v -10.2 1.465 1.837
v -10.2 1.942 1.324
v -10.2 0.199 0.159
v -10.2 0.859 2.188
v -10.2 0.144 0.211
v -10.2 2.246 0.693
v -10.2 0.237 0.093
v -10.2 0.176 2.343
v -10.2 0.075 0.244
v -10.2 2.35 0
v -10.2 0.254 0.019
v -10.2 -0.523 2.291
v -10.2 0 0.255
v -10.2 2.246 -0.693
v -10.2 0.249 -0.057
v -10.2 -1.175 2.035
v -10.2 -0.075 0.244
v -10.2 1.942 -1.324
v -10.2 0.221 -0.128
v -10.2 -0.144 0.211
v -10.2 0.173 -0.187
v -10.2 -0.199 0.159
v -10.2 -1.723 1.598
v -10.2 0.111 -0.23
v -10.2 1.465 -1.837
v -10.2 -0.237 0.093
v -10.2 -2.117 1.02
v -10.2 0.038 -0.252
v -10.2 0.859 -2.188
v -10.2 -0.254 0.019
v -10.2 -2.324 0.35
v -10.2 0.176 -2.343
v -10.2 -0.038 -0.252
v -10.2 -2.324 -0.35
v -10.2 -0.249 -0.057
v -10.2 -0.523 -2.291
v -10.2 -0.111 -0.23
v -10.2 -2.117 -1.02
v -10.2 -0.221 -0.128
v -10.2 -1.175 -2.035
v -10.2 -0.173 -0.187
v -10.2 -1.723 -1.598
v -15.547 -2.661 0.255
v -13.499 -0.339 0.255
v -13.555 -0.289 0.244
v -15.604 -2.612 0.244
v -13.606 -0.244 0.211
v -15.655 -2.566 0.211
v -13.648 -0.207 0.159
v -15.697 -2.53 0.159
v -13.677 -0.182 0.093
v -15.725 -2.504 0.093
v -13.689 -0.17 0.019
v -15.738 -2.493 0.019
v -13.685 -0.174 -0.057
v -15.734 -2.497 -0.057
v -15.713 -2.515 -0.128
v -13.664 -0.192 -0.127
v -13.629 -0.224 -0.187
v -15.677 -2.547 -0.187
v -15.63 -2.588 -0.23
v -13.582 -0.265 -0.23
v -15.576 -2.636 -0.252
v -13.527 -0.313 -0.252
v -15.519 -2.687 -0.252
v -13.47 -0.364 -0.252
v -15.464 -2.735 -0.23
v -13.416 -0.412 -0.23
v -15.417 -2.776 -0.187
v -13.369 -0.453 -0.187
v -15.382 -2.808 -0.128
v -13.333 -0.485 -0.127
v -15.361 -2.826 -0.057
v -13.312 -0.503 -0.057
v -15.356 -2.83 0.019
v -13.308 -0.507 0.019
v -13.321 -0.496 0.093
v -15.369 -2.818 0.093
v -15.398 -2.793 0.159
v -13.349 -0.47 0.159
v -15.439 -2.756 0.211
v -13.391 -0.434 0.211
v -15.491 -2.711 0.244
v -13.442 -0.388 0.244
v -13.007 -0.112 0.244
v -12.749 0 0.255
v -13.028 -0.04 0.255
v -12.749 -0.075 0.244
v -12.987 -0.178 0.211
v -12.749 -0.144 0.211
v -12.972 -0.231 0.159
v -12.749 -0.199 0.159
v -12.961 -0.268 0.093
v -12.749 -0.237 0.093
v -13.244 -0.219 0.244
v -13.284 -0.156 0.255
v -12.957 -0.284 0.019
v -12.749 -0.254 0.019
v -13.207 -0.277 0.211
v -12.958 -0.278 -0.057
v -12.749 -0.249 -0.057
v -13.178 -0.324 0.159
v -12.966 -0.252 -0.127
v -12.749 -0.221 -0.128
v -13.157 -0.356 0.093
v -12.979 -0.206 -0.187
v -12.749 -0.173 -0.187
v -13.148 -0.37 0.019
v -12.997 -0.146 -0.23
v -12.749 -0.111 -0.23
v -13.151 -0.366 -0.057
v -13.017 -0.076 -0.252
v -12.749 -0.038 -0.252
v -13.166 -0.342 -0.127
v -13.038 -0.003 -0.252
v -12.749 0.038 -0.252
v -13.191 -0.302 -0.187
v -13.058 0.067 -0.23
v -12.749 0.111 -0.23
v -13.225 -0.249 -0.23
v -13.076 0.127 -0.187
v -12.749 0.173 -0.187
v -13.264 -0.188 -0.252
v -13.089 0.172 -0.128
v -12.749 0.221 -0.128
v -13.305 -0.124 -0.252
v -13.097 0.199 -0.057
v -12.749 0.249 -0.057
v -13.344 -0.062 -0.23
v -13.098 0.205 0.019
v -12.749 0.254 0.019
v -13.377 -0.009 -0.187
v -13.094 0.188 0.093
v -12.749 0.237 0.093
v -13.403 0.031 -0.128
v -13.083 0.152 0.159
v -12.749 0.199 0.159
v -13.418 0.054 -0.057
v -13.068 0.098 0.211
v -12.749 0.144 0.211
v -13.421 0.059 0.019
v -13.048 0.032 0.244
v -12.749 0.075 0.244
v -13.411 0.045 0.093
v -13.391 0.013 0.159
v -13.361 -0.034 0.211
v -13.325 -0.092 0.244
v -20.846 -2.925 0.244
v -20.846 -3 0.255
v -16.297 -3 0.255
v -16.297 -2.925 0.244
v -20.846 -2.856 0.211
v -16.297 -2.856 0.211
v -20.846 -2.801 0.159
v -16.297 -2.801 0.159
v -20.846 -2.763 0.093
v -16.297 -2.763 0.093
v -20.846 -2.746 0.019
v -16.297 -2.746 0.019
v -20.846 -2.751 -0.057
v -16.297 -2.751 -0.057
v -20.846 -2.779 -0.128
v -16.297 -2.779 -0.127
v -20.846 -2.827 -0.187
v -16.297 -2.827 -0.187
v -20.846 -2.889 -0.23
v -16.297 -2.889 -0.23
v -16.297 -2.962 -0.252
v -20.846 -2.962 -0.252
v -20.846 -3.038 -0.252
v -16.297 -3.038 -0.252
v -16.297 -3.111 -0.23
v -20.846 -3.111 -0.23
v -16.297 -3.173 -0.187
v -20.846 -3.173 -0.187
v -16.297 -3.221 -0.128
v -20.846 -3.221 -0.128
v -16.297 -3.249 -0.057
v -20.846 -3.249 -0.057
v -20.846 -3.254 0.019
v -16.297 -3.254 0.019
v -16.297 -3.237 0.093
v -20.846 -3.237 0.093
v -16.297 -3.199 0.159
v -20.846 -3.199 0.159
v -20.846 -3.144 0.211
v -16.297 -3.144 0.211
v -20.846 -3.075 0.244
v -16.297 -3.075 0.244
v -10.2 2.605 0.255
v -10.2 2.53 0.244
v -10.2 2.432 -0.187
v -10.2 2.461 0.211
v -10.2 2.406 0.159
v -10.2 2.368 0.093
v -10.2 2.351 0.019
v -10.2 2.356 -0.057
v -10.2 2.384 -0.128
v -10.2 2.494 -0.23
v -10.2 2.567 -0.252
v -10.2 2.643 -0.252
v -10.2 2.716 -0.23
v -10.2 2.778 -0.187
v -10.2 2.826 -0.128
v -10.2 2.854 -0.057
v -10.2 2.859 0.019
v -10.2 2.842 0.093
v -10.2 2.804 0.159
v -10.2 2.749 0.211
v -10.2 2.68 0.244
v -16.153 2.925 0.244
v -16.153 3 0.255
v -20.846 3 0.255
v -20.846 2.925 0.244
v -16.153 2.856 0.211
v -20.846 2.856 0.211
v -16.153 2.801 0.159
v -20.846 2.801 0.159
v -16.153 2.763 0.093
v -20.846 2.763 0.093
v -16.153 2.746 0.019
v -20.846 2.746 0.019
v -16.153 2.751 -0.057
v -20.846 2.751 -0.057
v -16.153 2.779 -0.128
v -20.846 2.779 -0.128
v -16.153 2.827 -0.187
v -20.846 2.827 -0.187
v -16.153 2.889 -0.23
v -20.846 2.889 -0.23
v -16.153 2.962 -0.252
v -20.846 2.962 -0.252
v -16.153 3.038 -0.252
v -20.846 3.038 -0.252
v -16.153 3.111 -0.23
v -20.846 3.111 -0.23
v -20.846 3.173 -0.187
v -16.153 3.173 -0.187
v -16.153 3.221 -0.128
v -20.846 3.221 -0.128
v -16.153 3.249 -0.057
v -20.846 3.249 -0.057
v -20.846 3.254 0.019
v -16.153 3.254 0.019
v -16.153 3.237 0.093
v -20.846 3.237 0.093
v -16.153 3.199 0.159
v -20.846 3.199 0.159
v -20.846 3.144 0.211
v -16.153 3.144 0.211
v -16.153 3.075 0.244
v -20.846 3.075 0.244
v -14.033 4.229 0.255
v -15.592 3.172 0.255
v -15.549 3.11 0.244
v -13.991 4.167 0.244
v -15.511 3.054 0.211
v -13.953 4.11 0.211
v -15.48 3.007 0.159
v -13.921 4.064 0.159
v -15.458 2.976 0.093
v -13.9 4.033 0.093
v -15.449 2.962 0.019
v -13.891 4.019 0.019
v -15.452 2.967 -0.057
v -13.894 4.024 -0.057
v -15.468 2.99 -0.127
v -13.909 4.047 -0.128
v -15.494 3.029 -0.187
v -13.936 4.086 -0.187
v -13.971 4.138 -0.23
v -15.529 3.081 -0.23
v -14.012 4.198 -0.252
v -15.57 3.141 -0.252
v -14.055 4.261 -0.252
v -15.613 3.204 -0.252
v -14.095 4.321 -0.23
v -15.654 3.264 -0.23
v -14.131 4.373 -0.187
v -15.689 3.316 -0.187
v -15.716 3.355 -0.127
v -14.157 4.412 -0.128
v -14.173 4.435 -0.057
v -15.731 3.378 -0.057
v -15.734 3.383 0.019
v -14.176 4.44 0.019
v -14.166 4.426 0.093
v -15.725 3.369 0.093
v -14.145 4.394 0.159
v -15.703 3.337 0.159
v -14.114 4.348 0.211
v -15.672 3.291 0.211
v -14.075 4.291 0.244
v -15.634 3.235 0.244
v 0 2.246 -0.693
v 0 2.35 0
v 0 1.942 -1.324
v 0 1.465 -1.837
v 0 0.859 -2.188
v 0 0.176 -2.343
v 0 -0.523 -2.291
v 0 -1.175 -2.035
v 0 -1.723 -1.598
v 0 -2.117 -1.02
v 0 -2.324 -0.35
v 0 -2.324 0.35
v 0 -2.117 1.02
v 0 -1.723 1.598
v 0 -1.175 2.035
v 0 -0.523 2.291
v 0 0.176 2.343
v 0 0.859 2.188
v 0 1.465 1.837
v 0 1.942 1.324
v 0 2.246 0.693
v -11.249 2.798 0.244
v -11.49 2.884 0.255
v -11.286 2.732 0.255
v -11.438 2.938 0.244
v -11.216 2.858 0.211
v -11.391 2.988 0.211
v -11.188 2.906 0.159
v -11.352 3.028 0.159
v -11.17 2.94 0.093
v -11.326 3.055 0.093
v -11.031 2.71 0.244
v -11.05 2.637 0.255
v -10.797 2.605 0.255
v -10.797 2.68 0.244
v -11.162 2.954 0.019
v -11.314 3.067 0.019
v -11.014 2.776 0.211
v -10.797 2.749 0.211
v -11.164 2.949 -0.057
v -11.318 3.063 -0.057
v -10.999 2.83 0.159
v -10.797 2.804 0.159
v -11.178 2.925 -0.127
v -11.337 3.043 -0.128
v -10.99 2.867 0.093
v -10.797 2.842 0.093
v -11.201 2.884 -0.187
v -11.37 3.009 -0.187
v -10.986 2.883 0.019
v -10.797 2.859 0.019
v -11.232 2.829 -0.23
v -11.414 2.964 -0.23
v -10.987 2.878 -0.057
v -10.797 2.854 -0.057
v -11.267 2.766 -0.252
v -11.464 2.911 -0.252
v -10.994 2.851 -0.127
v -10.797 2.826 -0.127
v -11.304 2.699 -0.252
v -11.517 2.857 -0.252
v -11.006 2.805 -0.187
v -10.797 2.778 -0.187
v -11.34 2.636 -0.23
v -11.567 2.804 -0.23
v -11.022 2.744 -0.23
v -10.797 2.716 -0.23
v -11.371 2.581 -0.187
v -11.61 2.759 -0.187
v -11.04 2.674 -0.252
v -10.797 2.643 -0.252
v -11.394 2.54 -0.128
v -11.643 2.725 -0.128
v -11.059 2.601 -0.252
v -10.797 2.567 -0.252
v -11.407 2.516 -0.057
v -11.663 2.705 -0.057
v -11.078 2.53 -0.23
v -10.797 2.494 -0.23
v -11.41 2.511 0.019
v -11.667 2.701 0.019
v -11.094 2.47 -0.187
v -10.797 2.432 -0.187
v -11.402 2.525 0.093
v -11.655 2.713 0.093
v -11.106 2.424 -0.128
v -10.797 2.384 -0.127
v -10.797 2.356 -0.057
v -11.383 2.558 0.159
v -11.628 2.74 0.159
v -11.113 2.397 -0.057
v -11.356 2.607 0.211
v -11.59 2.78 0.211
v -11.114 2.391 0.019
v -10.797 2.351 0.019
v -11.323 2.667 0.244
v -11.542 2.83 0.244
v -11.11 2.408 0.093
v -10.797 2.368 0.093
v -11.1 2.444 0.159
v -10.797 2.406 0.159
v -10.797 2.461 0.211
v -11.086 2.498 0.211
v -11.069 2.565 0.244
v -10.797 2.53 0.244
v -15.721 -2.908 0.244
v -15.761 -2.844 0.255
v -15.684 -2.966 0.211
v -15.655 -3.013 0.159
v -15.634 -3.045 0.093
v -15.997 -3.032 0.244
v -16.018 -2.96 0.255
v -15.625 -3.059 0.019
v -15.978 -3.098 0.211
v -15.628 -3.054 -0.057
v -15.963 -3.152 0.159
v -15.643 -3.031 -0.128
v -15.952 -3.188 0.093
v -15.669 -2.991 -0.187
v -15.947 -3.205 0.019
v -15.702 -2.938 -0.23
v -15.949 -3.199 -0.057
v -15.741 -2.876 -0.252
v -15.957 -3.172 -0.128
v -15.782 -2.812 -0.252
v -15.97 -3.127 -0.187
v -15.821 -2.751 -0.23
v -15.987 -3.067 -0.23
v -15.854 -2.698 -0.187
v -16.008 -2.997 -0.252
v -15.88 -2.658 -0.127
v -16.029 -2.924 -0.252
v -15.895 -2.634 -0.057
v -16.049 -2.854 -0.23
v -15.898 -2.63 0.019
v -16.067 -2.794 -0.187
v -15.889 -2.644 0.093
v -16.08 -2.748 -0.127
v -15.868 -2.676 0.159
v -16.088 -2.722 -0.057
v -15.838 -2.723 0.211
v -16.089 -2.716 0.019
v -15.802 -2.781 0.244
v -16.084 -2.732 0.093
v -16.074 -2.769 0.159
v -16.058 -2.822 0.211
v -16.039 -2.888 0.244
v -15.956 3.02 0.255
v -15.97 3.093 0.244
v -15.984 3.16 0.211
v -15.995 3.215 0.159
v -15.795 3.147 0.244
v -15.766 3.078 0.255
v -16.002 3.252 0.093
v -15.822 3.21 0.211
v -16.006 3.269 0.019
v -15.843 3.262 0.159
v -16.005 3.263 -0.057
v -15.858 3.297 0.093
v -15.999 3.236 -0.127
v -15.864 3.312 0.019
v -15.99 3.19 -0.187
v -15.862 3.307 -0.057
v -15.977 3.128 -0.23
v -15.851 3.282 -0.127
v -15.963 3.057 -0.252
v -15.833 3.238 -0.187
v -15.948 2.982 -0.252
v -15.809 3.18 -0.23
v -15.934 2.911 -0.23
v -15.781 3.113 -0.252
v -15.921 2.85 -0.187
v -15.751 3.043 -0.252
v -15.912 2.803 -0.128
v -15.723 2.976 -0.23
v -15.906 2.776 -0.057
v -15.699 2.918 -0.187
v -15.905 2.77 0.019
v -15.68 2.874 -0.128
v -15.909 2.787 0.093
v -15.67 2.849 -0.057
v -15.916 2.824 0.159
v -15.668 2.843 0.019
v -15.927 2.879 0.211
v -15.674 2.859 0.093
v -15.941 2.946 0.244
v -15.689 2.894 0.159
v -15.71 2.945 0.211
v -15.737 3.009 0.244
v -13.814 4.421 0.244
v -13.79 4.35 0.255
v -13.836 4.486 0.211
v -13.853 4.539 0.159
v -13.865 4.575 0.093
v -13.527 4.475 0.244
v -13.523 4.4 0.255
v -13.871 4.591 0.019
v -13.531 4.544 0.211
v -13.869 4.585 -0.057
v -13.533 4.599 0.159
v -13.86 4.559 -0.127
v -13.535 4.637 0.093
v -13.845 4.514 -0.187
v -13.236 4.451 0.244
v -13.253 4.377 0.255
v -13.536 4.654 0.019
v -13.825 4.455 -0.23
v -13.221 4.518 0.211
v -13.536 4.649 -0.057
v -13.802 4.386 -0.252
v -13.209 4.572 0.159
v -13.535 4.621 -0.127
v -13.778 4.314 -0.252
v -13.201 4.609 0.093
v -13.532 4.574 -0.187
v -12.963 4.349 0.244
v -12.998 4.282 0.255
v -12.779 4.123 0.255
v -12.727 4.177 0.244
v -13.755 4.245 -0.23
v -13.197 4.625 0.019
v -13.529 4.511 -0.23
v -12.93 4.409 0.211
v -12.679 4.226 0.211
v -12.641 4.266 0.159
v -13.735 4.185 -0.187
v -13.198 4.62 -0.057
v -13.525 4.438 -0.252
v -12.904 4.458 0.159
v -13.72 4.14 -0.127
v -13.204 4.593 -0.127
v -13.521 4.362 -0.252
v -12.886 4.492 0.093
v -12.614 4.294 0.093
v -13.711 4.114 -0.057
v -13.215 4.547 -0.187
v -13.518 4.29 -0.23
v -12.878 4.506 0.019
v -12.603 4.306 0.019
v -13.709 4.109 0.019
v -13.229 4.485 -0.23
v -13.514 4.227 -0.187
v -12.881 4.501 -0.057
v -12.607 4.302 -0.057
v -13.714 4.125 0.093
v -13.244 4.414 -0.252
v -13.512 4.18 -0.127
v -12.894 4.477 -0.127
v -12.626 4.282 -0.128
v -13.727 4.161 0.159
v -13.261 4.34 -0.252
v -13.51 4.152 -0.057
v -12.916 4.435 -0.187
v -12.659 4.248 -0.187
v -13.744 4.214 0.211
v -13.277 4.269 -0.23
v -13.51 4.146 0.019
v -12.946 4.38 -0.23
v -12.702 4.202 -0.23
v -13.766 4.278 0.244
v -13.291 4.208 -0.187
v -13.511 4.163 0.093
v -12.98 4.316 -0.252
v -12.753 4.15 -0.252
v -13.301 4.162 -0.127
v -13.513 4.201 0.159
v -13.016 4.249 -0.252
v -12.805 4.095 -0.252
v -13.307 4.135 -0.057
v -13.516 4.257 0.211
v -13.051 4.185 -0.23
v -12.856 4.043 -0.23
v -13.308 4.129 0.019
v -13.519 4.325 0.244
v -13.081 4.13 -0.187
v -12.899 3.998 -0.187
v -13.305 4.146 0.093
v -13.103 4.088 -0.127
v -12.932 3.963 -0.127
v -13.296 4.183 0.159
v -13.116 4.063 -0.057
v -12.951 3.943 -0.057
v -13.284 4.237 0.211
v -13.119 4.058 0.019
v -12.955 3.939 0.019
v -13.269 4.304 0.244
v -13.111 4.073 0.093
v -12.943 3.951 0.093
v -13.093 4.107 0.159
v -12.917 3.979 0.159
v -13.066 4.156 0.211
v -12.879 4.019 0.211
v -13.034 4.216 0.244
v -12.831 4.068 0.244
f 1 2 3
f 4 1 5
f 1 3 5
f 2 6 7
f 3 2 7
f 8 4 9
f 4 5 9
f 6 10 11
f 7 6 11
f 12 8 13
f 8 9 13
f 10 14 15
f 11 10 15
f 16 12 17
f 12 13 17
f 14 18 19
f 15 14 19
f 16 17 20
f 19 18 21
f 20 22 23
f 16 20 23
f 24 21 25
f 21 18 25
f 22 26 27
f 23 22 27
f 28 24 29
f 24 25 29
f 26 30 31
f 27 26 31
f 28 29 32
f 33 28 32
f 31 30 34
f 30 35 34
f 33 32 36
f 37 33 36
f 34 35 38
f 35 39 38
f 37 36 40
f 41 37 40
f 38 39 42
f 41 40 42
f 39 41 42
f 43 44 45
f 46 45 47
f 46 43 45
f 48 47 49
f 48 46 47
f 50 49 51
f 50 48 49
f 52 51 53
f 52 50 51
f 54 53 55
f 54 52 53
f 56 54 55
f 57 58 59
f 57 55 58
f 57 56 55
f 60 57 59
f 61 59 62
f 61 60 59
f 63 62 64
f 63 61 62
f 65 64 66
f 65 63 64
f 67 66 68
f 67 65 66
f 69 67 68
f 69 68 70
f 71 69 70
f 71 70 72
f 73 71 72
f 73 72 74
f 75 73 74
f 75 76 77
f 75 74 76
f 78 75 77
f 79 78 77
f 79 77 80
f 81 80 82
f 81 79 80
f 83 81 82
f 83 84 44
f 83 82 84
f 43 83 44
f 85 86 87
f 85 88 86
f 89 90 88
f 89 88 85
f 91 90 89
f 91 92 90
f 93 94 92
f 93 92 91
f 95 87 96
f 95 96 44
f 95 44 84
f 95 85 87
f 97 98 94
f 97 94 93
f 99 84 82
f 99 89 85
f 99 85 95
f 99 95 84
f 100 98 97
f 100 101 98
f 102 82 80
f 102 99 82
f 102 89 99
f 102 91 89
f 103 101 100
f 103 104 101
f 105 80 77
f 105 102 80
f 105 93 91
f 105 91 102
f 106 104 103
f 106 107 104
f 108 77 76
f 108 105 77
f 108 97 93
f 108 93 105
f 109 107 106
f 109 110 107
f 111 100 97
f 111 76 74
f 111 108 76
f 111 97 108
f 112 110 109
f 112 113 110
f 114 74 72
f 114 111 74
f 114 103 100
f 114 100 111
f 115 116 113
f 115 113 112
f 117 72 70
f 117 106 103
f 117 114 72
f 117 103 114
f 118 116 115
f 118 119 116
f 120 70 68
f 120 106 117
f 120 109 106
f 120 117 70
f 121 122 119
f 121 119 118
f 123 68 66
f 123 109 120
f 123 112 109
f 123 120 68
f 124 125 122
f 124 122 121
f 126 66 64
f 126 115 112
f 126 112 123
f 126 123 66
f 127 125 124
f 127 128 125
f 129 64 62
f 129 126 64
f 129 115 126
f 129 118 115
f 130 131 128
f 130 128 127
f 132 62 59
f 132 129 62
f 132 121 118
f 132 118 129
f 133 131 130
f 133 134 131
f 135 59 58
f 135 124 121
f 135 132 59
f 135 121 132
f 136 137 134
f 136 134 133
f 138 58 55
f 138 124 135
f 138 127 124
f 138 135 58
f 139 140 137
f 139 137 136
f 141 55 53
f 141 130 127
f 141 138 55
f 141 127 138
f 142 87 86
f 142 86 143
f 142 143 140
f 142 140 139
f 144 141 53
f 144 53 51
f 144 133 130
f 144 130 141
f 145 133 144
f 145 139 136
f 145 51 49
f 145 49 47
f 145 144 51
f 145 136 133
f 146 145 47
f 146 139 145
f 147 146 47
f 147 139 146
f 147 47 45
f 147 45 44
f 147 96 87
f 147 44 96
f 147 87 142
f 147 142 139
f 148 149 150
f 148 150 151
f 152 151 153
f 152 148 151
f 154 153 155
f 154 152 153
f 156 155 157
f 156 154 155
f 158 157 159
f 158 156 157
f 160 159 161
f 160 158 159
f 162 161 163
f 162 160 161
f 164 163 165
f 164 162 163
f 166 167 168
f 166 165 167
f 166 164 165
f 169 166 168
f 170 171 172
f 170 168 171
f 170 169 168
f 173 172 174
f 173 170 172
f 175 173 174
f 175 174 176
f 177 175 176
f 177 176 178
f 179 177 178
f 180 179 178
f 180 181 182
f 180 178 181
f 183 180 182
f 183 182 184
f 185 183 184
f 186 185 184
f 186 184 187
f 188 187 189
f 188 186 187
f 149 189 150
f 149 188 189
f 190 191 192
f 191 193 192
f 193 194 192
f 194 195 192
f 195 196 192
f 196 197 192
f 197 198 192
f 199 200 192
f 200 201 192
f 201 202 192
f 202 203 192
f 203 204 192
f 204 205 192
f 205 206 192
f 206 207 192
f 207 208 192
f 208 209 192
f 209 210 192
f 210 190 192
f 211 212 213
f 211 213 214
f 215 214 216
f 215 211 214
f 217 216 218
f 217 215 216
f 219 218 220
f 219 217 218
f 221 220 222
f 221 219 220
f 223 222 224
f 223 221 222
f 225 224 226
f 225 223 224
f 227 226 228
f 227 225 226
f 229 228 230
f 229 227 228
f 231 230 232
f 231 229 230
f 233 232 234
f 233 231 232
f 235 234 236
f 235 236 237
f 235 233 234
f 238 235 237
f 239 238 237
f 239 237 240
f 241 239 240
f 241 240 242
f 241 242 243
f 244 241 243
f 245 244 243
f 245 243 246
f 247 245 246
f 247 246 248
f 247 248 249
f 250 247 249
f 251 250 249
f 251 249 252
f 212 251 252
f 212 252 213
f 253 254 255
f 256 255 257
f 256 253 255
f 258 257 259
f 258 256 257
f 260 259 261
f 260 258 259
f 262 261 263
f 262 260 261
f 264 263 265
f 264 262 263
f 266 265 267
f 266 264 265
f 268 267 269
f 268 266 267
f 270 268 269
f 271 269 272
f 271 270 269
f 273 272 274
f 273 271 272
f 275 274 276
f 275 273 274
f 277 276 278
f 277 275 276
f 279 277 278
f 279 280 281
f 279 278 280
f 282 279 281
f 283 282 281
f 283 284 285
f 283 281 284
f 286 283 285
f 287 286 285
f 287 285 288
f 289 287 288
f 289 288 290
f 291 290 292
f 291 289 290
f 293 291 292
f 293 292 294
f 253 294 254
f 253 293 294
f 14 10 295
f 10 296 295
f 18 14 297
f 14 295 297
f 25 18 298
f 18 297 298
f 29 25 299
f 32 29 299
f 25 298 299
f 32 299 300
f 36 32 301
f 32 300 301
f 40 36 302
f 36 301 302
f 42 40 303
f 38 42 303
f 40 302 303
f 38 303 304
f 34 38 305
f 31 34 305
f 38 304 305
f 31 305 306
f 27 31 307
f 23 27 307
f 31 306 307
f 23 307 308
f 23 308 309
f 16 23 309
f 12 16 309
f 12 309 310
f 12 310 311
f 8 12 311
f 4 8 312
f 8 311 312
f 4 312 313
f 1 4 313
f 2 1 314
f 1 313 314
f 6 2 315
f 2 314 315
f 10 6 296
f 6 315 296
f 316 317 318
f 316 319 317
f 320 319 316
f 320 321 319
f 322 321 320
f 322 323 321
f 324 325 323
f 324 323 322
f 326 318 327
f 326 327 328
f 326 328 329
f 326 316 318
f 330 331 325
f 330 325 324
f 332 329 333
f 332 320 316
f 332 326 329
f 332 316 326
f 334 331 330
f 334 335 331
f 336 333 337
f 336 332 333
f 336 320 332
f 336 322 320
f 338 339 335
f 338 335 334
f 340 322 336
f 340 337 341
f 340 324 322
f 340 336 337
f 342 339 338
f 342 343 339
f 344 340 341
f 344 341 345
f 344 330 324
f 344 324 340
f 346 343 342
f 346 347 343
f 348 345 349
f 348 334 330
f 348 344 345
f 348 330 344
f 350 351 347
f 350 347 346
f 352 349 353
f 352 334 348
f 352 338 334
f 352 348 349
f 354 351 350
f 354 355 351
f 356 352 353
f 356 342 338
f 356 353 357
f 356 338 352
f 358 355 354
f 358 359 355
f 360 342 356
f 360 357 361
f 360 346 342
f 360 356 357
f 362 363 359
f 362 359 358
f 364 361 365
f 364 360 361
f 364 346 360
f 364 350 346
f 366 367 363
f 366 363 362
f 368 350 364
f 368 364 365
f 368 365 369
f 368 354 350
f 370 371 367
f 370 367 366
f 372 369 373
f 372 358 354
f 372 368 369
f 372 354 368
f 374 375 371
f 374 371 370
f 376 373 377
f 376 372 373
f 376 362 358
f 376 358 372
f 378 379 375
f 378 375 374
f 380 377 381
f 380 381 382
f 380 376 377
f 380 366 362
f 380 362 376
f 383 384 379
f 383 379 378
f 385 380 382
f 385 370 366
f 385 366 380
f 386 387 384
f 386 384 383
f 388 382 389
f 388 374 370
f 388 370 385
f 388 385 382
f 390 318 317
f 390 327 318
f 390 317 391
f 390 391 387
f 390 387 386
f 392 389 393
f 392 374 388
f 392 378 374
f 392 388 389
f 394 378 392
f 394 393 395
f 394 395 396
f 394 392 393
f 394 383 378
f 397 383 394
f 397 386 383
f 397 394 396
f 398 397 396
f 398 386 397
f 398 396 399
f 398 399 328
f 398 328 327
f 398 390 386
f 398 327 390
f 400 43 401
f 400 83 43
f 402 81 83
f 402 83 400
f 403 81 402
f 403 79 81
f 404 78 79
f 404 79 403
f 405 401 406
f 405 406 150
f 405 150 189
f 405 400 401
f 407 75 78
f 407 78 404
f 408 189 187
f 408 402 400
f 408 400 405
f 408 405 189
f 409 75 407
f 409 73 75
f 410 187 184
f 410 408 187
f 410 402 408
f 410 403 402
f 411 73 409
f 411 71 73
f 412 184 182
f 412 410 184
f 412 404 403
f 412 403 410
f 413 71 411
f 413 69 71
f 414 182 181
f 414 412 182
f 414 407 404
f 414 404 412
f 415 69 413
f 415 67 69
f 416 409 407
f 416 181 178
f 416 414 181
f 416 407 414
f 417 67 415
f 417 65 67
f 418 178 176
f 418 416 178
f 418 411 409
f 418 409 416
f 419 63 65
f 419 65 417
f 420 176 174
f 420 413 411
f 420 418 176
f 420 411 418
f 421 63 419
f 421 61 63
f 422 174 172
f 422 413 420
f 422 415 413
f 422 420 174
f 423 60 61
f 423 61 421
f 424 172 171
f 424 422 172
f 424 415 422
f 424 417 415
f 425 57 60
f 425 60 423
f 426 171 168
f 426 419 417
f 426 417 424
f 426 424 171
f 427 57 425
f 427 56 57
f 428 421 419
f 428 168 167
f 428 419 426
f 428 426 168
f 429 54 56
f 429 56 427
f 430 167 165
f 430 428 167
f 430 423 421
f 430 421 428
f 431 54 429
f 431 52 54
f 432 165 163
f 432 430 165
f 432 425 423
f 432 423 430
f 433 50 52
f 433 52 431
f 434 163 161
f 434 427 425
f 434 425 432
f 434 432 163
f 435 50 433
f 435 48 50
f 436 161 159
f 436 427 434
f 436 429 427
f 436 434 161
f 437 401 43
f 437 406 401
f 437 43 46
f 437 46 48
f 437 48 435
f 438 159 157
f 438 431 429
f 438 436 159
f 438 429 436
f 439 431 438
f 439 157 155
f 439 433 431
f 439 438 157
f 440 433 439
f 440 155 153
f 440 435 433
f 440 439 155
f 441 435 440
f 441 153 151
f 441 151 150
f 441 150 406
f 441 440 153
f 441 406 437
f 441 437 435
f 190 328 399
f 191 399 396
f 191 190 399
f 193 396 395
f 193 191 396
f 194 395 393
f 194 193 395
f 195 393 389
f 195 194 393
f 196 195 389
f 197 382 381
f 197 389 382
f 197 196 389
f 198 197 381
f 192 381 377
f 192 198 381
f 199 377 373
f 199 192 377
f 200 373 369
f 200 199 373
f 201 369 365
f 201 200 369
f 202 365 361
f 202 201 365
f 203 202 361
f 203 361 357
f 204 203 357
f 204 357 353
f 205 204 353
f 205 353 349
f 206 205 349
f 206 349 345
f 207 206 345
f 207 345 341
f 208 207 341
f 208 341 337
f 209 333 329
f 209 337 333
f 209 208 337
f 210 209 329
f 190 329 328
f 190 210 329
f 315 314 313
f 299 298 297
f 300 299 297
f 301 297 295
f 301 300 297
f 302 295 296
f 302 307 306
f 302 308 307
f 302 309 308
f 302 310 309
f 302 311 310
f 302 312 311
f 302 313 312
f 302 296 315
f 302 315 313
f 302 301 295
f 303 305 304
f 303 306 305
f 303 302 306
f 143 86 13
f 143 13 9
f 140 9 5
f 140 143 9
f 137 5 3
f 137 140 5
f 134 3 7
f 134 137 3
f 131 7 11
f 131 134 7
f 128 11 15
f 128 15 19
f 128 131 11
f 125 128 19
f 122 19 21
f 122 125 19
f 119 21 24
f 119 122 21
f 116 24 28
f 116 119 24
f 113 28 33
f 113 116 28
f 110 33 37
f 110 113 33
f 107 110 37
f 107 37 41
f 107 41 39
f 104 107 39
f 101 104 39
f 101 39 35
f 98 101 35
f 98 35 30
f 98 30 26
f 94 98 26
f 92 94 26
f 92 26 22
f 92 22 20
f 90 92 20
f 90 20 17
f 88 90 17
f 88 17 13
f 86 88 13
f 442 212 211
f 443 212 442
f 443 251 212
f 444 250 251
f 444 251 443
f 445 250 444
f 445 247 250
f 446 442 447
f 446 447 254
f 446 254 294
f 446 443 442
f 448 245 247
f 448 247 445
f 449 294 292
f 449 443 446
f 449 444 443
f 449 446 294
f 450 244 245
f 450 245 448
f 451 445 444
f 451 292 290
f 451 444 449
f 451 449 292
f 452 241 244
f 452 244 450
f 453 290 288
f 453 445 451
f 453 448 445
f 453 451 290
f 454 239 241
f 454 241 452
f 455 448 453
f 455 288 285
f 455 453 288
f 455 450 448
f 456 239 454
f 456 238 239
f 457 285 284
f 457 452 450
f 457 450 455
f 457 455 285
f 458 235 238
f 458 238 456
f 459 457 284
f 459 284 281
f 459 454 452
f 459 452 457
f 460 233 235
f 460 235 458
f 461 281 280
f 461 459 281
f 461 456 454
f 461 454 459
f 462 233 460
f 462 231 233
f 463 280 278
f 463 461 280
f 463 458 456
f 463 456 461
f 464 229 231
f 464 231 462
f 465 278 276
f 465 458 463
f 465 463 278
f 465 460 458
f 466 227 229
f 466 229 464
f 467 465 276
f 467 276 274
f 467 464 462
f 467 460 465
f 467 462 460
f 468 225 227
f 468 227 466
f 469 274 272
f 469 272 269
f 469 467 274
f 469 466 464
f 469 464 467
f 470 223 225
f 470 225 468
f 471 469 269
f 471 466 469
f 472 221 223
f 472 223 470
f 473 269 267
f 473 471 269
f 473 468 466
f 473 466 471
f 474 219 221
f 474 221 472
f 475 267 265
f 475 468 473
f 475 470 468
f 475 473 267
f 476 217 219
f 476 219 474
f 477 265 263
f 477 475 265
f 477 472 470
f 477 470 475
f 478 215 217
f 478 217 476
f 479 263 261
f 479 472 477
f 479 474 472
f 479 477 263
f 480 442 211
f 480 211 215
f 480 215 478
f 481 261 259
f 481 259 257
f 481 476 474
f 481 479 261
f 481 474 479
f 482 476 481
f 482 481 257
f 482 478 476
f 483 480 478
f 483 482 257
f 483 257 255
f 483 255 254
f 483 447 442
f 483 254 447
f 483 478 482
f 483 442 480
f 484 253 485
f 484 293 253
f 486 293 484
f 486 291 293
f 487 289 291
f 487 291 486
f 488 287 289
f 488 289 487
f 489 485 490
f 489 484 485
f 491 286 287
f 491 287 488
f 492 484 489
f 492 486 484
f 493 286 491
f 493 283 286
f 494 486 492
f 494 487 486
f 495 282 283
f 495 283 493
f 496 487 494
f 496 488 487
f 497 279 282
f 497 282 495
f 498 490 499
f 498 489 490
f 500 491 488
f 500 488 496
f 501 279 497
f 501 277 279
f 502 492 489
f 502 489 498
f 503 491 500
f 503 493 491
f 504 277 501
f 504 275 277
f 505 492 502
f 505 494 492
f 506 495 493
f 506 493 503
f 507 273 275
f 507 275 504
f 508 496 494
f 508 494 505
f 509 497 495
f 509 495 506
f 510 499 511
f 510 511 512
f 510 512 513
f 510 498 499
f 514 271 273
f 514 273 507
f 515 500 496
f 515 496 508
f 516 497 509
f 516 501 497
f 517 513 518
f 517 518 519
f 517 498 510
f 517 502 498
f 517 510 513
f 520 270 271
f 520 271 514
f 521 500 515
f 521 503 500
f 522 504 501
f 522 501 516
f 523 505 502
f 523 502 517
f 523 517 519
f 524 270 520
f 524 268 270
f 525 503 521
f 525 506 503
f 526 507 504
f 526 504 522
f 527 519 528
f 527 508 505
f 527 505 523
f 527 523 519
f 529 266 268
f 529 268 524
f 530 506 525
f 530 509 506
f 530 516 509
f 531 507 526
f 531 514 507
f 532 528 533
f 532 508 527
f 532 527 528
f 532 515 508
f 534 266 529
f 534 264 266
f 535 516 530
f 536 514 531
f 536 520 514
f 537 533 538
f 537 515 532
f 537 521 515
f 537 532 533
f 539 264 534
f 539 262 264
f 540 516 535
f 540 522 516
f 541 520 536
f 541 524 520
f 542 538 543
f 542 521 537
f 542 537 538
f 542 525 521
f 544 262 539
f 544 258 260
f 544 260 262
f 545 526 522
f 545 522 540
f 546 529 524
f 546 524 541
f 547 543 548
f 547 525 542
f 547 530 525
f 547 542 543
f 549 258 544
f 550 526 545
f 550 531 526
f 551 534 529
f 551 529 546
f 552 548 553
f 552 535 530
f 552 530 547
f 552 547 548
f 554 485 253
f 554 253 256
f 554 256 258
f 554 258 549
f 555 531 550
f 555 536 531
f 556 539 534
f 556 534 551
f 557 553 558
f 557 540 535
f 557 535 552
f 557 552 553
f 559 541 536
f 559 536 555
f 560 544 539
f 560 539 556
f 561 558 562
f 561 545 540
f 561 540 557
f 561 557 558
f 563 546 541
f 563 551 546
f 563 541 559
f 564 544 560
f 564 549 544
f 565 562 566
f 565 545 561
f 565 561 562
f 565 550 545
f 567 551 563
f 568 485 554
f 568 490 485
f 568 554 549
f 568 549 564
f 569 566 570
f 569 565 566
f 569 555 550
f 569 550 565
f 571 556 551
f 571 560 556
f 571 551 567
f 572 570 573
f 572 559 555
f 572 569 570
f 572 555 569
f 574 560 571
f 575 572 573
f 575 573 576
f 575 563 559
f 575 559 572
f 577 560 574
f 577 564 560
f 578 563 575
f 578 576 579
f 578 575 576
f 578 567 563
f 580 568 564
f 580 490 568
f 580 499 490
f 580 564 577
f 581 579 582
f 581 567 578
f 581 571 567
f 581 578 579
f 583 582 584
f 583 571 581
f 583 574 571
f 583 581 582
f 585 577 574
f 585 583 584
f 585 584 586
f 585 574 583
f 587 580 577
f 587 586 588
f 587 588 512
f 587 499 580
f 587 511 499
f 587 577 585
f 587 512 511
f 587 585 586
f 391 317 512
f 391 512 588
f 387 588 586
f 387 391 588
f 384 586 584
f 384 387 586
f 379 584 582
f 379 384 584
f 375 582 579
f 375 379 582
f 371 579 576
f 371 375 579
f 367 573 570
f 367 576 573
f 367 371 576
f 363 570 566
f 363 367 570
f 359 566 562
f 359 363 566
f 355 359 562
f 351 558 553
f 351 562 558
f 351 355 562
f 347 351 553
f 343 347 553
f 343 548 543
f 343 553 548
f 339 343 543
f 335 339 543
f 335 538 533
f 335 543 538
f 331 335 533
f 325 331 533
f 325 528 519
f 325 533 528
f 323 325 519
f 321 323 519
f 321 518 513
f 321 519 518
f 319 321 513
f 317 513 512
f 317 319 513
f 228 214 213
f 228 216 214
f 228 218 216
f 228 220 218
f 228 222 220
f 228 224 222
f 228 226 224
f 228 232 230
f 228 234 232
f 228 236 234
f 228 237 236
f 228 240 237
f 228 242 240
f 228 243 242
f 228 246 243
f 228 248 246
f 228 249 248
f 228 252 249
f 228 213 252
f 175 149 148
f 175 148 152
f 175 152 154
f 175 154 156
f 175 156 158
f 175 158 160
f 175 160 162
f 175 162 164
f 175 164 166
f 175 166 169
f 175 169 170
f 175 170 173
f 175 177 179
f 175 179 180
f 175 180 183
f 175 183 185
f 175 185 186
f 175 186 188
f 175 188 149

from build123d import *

# Parameters (mm, degrees)
SKETCH1_W = 10.2
SKETCH1_H = 2.35
SKETCH5_R = 0.255
SKETCH7_R = 0.255


with BuildPart() as part:
    # Sketch1 → Revolve1 (revolve)
    with BuildSketch(Plane.XY):
        with Locations((-5.1, 1.175)):
            Rectangle(SKETCH1_W, SKETCH1_H)
    revolve(axis=Axis((0, 0, 0), (-1, 0, 0)))

    # Sweep1: sweep along a path in Sketch4
    with BuildLine(Plane.XY) as sweep1_path:
        Line((-10.2, 0), (-12.74858377, 0))
        ThreePointArc((-12.74858377, 0), (-13.160021598, -0.088562172), (-13.49858377, -0.338562172))
        Line((-13.49858377, -0.338562172), (-15.547167541, -2.661437828))
        ThreePointArc((-15.547167541, -2.661437828), (-15.885729713, -2.911437828), (-16.297167541, -3))
        Line((-16.297167541, -3), (-20.845751311, -3))
    # Sketch5 → Sweep1 (sweep)
    with BuildSketch(Plane.ZY.offset(10.2)):
        Circle(SKETCH5_R)
    sweep(path=sweep1_path.line)


with BuildPart() as body_2:
    # Sweep2: sweep along a path in Sketch6
    with BuildLine(Plane.XY) as sweep2_path:
        Line((-20.845751311, 3), (-16.152872624, 3))
        ThreePointArc((-16.152872624, 3), (-15.85928544, 3.044067698), (-15.59157368, 3.172386869))
        Line((-15.59157368, 3.172386869), (-14.033231363, 4.229276693))
        ThreePointArc((-14.033231363, 4.229276693), (-13.387214162, 4.398068507), (-12.778966808, 4.1226342))
        Line((-12.778966808, 4.1226342), (-11.490305859, 2.884029361))
        ThreePointArc((-11.490305859, 2.884029361), (-11.170856888, 2.677376521), (-10.797340248, 2.605))
        Line((-10.797340248, 2.605), (-10.2, 2.605))
    # Sketch7 → Sweep2 (sweep)
    with BuildSketch(Plane.ZY.offset(10.2)):
        with Locations((0, 2.605)):
            Circle(SKETCH7_R)
    sweep(path=sweep2_path.line)


solid = Compound([part.part, body_2.part])
